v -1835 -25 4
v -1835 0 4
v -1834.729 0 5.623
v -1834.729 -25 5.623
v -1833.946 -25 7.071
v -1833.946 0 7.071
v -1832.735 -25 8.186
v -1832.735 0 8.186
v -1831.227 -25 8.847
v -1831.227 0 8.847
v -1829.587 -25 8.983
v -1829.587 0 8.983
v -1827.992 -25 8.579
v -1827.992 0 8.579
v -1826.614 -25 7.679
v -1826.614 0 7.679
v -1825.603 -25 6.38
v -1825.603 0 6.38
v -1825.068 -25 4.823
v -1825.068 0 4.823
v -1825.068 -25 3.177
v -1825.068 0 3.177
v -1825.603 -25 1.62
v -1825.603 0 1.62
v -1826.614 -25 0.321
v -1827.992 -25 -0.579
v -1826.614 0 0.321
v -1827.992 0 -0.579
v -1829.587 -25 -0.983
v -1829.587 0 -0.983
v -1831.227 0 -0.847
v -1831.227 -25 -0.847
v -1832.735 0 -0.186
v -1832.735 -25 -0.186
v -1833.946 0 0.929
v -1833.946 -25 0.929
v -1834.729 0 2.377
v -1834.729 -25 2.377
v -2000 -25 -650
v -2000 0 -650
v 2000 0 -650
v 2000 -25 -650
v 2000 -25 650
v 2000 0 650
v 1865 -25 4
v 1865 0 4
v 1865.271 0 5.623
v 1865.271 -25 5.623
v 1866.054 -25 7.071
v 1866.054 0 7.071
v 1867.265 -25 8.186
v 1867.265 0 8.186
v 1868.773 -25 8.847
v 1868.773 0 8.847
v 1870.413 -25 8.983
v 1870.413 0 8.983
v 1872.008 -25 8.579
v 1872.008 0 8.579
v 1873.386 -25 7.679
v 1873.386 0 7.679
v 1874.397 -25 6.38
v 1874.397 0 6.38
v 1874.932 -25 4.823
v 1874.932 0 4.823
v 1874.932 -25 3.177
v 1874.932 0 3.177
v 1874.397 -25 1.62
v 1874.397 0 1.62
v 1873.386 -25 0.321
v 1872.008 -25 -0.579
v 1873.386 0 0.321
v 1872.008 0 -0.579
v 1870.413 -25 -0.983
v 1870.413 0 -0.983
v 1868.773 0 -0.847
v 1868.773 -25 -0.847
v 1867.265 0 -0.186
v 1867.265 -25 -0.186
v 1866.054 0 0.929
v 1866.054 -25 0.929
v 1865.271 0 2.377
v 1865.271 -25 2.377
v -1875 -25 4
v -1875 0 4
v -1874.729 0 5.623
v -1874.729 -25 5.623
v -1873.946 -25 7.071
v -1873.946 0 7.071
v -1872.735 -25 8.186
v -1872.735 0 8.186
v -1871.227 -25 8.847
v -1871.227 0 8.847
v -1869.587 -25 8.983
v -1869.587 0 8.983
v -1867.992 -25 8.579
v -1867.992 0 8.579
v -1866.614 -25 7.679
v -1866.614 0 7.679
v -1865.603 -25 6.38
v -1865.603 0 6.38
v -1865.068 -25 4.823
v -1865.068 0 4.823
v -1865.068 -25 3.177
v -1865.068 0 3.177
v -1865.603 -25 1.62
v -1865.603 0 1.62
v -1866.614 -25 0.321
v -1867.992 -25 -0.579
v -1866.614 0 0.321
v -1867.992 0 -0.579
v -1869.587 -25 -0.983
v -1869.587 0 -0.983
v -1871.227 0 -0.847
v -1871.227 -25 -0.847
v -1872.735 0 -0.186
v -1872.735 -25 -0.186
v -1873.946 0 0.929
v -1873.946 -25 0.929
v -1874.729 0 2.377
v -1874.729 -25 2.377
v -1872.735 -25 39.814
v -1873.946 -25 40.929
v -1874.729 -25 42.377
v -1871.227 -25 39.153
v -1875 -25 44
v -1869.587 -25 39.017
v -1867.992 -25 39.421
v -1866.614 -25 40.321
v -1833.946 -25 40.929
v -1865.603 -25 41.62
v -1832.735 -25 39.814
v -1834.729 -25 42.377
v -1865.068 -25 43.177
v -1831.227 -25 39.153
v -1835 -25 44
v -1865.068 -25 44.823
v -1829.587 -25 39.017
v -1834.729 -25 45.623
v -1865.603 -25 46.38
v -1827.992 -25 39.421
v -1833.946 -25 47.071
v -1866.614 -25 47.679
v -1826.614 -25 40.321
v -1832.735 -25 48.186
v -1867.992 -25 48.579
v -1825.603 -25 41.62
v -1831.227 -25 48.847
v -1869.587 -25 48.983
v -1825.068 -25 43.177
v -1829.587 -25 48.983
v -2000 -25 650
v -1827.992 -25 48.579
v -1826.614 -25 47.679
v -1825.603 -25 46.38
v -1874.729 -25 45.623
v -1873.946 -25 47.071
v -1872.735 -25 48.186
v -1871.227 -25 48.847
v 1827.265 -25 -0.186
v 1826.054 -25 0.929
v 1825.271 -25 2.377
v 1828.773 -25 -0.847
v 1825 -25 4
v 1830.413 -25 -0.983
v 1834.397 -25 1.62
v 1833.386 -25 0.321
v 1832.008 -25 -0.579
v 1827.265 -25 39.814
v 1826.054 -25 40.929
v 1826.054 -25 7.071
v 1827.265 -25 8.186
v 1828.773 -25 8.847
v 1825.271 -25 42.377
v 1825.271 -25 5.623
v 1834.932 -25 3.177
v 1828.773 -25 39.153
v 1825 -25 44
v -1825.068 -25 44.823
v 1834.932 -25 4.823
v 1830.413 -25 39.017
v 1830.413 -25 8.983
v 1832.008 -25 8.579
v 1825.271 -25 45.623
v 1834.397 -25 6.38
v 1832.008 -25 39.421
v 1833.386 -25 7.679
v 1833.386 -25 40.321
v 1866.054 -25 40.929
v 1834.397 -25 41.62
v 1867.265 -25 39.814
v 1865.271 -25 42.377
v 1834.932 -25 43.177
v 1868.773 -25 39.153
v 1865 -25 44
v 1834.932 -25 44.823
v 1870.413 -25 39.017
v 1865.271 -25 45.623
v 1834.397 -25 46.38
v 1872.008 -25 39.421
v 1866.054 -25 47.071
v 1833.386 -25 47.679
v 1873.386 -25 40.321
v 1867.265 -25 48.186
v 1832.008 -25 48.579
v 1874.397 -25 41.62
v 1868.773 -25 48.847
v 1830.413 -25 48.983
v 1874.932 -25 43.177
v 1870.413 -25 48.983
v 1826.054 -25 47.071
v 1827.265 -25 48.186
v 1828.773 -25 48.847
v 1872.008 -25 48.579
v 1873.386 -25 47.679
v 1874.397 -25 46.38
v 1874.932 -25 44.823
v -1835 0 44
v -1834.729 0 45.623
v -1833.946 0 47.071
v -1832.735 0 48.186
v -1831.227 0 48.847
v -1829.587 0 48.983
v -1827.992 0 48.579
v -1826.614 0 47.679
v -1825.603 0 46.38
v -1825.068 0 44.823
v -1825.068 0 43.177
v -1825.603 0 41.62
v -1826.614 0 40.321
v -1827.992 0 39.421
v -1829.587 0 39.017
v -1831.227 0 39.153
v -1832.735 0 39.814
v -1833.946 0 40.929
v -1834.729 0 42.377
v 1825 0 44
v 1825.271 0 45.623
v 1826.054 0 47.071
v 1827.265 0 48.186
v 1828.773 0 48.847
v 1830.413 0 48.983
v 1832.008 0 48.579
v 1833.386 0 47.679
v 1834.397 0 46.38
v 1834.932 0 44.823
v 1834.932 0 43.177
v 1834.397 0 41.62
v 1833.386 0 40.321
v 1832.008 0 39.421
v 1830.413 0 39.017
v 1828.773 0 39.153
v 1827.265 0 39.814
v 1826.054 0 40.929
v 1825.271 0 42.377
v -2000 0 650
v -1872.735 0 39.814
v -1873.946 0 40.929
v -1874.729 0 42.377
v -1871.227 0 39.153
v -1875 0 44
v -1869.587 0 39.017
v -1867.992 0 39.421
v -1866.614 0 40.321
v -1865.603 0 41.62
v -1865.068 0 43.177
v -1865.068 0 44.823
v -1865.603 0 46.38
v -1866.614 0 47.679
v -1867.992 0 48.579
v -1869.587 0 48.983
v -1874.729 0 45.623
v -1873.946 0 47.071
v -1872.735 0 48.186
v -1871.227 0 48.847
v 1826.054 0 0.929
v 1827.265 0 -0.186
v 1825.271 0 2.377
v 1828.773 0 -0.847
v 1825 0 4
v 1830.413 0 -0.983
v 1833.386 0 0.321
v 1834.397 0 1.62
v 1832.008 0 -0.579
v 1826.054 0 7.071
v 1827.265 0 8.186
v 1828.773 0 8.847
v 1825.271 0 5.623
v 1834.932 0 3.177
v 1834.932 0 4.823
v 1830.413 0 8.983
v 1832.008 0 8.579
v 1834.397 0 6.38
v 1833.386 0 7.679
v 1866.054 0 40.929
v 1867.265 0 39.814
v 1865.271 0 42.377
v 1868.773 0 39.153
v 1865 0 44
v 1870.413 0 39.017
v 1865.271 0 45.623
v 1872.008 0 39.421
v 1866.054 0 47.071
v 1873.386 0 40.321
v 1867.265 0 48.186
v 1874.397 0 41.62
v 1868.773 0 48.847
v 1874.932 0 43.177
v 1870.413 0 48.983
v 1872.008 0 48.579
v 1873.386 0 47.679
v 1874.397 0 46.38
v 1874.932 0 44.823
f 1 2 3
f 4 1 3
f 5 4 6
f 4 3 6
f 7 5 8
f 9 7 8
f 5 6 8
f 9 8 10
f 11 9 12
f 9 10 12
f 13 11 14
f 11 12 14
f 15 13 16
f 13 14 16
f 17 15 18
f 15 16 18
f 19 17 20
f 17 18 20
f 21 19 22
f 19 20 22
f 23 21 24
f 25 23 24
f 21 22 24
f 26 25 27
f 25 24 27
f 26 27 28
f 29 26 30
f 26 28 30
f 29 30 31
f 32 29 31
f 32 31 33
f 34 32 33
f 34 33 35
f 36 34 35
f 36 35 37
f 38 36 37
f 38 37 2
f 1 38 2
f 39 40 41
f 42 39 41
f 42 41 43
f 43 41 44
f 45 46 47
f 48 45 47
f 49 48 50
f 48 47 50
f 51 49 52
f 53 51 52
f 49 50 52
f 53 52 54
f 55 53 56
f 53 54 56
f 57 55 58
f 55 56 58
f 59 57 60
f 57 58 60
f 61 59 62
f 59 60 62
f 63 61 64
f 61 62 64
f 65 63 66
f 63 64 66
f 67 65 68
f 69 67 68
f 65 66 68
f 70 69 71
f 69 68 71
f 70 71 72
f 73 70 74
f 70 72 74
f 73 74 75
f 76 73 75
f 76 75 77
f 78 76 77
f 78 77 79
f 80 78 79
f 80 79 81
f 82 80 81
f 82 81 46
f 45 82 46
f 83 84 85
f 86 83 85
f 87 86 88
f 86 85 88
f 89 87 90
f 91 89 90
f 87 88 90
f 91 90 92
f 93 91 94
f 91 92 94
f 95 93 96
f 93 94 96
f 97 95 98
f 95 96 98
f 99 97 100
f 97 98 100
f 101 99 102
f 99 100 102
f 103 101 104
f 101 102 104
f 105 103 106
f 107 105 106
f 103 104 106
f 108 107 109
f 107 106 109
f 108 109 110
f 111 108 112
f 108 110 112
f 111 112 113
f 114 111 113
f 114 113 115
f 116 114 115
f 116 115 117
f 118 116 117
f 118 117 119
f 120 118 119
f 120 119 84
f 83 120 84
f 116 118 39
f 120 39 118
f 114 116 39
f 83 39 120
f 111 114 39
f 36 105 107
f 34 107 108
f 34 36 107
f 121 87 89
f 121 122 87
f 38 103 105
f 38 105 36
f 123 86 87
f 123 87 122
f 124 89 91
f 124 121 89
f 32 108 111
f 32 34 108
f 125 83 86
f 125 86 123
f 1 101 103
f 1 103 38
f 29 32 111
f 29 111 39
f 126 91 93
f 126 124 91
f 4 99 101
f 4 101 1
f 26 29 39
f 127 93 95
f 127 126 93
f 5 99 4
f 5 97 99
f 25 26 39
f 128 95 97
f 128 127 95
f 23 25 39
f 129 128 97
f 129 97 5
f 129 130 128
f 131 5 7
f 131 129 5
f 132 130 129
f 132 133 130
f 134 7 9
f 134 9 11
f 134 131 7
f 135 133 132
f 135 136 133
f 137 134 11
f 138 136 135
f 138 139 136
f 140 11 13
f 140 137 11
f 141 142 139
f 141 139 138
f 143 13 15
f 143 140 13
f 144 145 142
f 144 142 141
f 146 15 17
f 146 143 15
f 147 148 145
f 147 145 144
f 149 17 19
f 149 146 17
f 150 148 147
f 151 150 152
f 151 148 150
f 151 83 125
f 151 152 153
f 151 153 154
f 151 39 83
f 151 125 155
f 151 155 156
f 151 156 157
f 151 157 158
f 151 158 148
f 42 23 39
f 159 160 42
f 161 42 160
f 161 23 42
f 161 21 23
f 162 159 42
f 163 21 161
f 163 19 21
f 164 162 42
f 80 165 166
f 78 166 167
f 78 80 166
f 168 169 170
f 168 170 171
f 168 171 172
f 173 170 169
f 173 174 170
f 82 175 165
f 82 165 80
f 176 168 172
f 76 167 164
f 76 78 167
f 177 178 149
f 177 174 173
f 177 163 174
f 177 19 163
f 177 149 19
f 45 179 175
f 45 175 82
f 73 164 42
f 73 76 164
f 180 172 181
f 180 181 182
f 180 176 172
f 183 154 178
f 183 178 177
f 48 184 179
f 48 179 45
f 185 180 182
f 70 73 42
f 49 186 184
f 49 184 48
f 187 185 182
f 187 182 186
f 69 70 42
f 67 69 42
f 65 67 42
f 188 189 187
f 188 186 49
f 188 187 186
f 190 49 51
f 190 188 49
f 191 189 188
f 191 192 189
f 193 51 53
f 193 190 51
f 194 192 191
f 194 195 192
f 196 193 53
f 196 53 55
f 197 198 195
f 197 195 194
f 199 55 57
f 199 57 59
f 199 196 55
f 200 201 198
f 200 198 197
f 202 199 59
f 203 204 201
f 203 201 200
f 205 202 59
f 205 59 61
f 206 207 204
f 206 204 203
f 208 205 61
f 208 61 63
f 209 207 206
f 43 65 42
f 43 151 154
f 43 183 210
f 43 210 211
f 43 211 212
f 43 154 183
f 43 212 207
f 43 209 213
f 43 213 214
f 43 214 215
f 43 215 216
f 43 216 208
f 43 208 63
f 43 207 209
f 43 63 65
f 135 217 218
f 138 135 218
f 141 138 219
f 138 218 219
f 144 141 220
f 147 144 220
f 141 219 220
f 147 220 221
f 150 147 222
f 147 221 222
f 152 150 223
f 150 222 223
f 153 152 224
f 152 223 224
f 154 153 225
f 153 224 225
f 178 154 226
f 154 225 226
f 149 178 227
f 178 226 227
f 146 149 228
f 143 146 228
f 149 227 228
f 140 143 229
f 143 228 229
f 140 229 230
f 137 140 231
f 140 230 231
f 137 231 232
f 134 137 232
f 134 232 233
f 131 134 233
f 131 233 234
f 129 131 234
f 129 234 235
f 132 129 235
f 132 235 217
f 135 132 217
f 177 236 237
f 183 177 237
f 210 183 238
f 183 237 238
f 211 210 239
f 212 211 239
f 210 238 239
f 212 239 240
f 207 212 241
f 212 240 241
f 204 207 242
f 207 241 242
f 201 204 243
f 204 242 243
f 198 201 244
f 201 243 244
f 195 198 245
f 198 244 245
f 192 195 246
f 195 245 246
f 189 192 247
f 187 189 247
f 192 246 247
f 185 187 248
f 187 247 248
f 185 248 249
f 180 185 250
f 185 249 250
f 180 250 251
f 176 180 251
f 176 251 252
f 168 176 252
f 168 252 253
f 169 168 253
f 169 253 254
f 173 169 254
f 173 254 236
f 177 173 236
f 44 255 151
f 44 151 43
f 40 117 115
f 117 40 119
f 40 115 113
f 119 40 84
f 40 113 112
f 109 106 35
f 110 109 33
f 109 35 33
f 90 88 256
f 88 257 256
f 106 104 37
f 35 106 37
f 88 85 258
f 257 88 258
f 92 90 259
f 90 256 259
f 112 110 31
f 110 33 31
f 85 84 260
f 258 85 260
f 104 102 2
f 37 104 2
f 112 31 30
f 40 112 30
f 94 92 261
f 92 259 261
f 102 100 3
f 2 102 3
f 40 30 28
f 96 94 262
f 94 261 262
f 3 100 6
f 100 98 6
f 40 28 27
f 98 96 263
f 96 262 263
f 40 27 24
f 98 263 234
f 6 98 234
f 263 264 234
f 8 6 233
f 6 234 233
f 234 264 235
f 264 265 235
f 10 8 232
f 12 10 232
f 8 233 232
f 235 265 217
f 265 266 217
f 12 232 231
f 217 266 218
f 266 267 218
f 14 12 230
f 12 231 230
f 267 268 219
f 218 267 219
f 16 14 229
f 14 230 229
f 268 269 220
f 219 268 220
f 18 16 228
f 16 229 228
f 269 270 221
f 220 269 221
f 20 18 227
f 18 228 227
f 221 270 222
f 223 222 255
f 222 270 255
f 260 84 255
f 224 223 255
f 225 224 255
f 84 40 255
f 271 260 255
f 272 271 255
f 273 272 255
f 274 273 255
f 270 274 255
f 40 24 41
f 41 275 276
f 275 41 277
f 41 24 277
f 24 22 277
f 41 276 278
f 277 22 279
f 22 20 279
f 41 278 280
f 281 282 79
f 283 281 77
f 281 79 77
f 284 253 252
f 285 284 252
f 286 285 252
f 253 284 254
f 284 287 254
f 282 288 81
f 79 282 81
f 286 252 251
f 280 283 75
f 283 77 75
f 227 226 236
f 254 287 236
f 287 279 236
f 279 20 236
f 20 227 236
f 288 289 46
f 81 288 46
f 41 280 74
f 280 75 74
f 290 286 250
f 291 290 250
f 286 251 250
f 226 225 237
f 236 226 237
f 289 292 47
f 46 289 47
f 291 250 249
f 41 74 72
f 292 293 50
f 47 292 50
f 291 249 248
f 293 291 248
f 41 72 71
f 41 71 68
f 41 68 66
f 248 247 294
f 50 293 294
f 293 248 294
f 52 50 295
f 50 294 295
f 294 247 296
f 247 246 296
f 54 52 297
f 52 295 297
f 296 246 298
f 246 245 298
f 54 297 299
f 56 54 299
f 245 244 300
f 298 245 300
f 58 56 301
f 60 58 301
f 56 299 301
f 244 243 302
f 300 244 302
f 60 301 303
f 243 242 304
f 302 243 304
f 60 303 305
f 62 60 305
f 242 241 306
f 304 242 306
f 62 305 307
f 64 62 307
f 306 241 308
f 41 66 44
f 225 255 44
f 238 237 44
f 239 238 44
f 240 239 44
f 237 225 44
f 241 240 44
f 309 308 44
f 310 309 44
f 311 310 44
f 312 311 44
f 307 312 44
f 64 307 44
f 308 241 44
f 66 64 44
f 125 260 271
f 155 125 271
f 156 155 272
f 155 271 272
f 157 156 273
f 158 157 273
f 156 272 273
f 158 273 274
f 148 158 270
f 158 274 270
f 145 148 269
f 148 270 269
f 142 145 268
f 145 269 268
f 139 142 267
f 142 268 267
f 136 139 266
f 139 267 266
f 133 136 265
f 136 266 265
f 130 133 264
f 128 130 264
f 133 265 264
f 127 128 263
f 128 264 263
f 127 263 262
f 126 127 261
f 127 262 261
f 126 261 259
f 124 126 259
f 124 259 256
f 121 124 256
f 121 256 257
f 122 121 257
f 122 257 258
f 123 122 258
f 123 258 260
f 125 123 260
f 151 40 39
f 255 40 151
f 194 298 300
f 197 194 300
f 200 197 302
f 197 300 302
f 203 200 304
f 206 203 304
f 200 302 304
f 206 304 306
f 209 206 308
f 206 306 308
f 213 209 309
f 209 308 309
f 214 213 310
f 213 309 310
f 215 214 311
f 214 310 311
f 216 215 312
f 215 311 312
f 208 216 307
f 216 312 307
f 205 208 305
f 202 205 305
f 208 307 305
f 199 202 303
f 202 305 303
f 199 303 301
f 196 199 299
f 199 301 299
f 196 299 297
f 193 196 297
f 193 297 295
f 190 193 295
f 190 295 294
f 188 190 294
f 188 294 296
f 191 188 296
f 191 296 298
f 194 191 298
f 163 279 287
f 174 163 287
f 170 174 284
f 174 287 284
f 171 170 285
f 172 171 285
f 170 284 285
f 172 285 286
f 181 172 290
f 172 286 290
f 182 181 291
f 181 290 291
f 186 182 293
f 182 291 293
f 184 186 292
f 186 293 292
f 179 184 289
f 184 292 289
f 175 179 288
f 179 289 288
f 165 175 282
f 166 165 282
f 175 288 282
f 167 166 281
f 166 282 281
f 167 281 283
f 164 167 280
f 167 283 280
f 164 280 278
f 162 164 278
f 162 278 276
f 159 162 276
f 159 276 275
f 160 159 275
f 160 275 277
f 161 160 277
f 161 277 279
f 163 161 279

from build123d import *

# Parameters (mm, degrees)
F0_W     = 4000
F0_H     = 1300
F1_DEPTH = 25
F3_D     = 10
F4_D     = 10


with BuildPart() as f1:
    # F0 (on Front) → F1 (new body)
    with BuildSketch(Plane.XZ):
        Rectangle(F0_W, F0_H)
    extrude(amount=F1_DEPTH)

    # F3 (through all)
    with Locations(Plane.XZ.offset(25)):
        with Locations((-1870, 44), (-1830, 44), (-1830, 4), (-1870, 4)):
            Hole(F3_D / 2)

    # F4 (through all)
    with Locations(Plane.XZ.offset(25)):
        with Locations((1830, 44), (1870, 44), (1870, 4), (1830, 4)):
            Hole(F4_D / 2)


solid = f1.part
